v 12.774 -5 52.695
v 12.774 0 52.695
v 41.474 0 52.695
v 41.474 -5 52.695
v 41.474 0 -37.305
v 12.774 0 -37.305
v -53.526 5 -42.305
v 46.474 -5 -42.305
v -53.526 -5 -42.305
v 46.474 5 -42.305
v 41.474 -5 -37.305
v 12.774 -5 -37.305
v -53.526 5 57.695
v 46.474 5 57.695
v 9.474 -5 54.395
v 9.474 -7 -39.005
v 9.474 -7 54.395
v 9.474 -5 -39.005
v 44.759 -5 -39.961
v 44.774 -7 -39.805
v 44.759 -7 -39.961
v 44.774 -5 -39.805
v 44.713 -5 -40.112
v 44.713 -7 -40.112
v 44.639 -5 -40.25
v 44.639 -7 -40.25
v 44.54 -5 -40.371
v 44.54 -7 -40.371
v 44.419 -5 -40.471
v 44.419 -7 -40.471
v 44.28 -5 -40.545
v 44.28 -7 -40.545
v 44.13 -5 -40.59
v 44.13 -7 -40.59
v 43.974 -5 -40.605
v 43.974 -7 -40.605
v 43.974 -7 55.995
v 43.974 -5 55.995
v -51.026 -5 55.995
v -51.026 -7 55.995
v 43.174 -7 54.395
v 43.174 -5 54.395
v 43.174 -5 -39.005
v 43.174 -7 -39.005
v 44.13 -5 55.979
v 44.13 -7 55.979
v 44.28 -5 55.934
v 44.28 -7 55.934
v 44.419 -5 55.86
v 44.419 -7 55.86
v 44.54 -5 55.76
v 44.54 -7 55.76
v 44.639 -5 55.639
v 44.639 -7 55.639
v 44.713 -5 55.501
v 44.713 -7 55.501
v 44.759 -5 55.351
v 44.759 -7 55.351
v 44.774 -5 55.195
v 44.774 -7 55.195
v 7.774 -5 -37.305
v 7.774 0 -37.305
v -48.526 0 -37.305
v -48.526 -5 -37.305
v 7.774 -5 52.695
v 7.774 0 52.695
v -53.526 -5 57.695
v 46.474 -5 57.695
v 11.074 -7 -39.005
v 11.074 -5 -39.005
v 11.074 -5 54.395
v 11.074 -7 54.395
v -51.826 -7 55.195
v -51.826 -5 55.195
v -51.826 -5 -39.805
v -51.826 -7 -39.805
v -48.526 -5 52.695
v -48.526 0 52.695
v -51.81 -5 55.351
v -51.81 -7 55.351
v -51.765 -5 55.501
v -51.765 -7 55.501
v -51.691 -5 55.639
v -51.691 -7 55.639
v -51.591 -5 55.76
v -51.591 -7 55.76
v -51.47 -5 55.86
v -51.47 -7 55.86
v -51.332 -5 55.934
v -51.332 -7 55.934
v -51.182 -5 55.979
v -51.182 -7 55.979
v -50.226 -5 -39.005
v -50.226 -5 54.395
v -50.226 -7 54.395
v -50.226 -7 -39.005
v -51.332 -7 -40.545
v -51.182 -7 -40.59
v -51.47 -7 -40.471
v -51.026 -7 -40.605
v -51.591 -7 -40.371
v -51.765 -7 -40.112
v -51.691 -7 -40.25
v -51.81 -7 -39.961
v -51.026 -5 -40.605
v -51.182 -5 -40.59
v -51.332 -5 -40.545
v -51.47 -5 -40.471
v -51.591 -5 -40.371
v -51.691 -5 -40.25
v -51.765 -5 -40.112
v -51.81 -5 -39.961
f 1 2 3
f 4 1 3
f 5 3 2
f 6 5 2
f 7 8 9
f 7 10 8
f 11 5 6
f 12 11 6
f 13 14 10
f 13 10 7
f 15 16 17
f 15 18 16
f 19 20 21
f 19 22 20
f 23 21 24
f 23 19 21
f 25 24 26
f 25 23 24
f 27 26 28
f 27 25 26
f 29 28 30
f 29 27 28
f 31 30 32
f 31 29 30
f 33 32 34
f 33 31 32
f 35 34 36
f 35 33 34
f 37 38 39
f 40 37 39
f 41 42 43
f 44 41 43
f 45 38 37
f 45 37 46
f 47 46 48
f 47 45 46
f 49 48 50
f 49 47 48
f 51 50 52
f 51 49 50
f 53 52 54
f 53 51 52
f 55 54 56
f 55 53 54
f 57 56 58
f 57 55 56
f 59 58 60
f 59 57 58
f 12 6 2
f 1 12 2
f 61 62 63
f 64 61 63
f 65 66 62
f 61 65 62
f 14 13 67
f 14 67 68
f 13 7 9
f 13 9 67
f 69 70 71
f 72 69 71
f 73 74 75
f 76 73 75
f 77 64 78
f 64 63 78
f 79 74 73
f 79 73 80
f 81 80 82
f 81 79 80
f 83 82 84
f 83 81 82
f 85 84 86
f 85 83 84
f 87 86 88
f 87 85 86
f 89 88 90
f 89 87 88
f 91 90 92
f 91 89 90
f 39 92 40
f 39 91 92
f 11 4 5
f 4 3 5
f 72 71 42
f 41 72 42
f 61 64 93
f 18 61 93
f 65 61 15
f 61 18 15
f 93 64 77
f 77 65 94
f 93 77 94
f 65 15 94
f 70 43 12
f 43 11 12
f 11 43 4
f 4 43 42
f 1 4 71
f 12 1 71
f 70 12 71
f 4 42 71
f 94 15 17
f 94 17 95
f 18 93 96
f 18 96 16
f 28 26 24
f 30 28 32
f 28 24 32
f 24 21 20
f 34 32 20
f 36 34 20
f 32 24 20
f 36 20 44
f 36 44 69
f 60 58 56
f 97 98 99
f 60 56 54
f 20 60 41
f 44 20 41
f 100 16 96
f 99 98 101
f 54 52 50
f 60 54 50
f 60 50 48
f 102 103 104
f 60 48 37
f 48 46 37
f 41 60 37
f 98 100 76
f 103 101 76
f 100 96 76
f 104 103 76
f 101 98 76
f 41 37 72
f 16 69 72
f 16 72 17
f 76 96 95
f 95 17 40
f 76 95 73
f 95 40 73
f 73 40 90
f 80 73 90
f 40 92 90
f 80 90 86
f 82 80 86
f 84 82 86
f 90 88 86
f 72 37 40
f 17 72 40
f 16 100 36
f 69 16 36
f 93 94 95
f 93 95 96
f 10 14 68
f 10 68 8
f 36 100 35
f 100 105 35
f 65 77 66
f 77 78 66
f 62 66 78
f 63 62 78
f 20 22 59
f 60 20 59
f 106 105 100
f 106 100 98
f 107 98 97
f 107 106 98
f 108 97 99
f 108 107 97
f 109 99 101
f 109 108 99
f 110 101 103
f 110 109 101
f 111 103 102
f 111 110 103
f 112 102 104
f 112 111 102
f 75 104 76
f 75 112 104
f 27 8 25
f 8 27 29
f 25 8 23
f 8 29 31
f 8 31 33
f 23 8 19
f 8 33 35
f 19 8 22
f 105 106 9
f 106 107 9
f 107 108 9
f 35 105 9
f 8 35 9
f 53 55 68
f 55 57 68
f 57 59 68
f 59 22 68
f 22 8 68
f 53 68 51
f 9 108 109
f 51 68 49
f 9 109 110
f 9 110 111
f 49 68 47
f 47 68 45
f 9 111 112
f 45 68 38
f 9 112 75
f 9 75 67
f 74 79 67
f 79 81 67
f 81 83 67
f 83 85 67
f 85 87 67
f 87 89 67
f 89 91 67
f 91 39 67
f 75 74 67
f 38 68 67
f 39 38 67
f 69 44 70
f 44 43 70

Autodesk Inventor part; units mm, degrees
ref_plane "YZ Plane" through (0, 0, 0) normal (1, 0, 0) x (0, 1, 0)
ref_plane "XZ Plane" through (0, 0, 0) normal (0, 1, 0) x (-1, 0, 0)
ref_plane "XY Plane" through (0, 0, 0) normal (0, 0, 1) x (1, 0, 0)
sketch "Sketch1" plane through (0, 0, 0) normal (0, 1, 0) x (-1, 0, 0)
  arc A0 (52.0258, 55.1946) -> (51.0258, 56.1946) centre (51.0258, 55.1946) ccw
  line L0 (-43.9742, 56.1946) -> (51.0258, 56.1946)
  arc A1 (-43.9742, 56.1946) -> (-44.9742, 55.1946) centre (-43.9742, 55.1946) ccw
  line L1 (-44.9742, -39.8054) -> (-44.9742, 55.1946)
  arc A2 (-44.9742, -39.8054) -> (-43.9742, -40.8054) centre (-43.9742, -39.8054) ccw
  line L2 (51.0258, -40.8054) -> (-43.9742, -40.8054)
  arc A3 (51.0258, -40.8054) -> (52.0258, -39.8054) centre (51.0258, -39.8054) ccw
  line L3 (52.0258, 55.1946) -> (52.0258, -39.8054)
  line L4 (-11.2742, 54.1946) -> (-42.9742, 54.1946)
  line L5 (-11.2742, -38.8054) -> (-11.2742, 54.1946)
  line L6 (-42.9742, -38.8054) -> (-11.2742, -38.8054)
  line L7 (-42.9742, 54.1946) -> (-42.9742, -38.8054)
  line L8 (50.0258, -38.8054) -> (50.0258, 54.1946)
  line L9 (-9.2742, -38.8054) -> (50.0258, -38.8054)
  line L10 (-9.2742, 54.1946) -> (-9.2742, -38.8054)
  line L11 (50.0258, 54.1946) -> (-9.2742, 54.1946)
  line L12 (53.5258, 57.6946) -> (-46.4742, 57.6946)
  line L13 (-46.4742, 57.6946) -> (-46.4742, -42.3054)
  line L14 (-46.4742, -42.3054) -> (53.5258, -42.3054)
  line L15 (53.5258, -42.3054) -> (53.5258, 57.6946)
  line L16 (51.0258, 55.1946) -> (-43.9742, 55.1946) construction
  line L17 (-43.9742, 55.1946) -> (-43.9742, -39.8054) construction
  line L18 (-43.9742, -39.8054) -> (51.0258, -39.8054) construction
  line L19 (51.0258, -39.8054) -> (51.0258, 55.1946) construction
  line L20 (-41.4742, -37.3054) -> (-12.7742, -37.3054)
  line L21 (-12.7742, -37.3054) -> (-12.7742, 52.6946)
  line L22 (-12.7742, 52.6946) -> (-41.4742, 52.6946)
  line L23 (-41.4742, 52.6946) -> (-41.4742, -37.3054)
  line L24 (-7.7742, -37.3054) -> (48.5258, -37.3054)
  line L25 (48.5258, -37.3054) -> (48.5258, 52.6946)
  line L26 (48.5258, 52.6946) -> (-7.7742, 52.6946)
  line L27 (-7.7742, 52.6946) -> (-7.7742, -37.3054)
  line L28 (-10.2742, 55.1946) -> (-10.2742, -39.8054) construction
  arc A4 (51.0258, -40.6054) -> (51.8258, -39.8054) centre (51.0258, -39.8054) ccw
  line L29 (51.0258, -40.6054) -> (-43.9742, -40.6054)
  arc A5 (-44.7742, -39.8054) -> (-43.9742, -40.6054) centre (-43.9742, -39.8054) ccw
  line L30 (-44.7742, -39.8054) -> (-44.7742, 55.1946)
  arc A6 (-43.9742, 55.9946) -> (-44.7742, 55.1946) centre (-43.9742, 55.1946) ccw
  line L31 (-43.9742, 55.9946) -> (51.0258, 55.9946)
  arc A7 (51.8258, 55.1946) -> (51.0258, 55.9946) centre (51.0258, 55.1946) ccw
  line L32 (51.8258, 55.1946) -> (51.8258, -39.8054)
  line L33 (50.2258, 54.3946) -> (50.2258, -39.0054)
  line L34 (50.2258, -39.0054) -> (-9.4742, -39.0054)
  line L35 (-9.4742, -39.0054) -> (-9.4742, 54.3946)
  line L36 (-9.4742, 54.3946) -> (50.2258, 54.3946)
  line L37 (-43.1742, -39.0054) -> (-11.0742, -39.0054)
  line L38 (-11.0742, -39.0054) -> (-11.0742, 54.3946)
  line L39 (-11.0742, 54.3946) -> (-43.1742, 54.3946)
  line L40 (-43.1742, 54.3946) -> (-43.1742, -39.0054)
  point P0 (0, 0)
  point P1 (-29.6242, 39.9946)
  dimension "d0" = 2
  dimension "d1" = 2.5
  dimension "d2" = 2.5
  dimension "d3" = 2.5
  dimension "d4" = 2.5
  dimension "d5" = 2.5
  dimension "d6" = 2.5
  dimension "d7" = 2.5
  dimension "d8" = 2.5
  dimension "d9" = 5
  dimension "d10" = 1
  dimension "d11" = 2
  dimension "d12" = 2.5
  dimension "d13" = 0.2
  dimension "d14" = 0.2
  dimension "d15" = 0.2
extrude "Extrusion1" add sketch "Sketch1" along normal blind 5 contours L3 A3 L2 A2 L1 A1 L0 A0 | L5 L6 L7 L4 | L9 L10 L11 L8 | L15 L14 L13 L12 | L23 L22 L21 L20 | L27 L26 L25 L24 | L29 A5 L30 A6 L31 A7 L32 A4 | L33 L34 L35 L36 | L40 L39 L38 L37
extrude "Extrusion2" add sketch "Sketch1" against normal blind 5 contours L3 A3 L2 A2 L1 A1 L0 A0 | L5 L6 L7 L4 | L9 L10 L11 L8 | L15 L14 L13 L12 | L29 A5 L30 A6 L31 A7 L32 A4 | L33 L34 L35 L36 | L40 L39 L38 L37
extrude "Extrusion3" add sketch "Sketch1" against normal blind 7 contours L29 A5 L30 A6 L31 A7 L32 A4
equation "\"d2\" = d1"
equation "\"d3\" = d2"
equation "\"d4\" = d1"
equation "\"d5\" = d2"
equation "\"d6\" = d1"
equation "\"d7\" = d4"
equation "\"d8\" = d7"
equation "\"d10\" = 0.5 * d11"
equation "\"d12\" = 0.5 * d9"
equation "\"d14\" = d13"
equation "\"d15\" = d14"
properties part number "plantBottomPlate"
